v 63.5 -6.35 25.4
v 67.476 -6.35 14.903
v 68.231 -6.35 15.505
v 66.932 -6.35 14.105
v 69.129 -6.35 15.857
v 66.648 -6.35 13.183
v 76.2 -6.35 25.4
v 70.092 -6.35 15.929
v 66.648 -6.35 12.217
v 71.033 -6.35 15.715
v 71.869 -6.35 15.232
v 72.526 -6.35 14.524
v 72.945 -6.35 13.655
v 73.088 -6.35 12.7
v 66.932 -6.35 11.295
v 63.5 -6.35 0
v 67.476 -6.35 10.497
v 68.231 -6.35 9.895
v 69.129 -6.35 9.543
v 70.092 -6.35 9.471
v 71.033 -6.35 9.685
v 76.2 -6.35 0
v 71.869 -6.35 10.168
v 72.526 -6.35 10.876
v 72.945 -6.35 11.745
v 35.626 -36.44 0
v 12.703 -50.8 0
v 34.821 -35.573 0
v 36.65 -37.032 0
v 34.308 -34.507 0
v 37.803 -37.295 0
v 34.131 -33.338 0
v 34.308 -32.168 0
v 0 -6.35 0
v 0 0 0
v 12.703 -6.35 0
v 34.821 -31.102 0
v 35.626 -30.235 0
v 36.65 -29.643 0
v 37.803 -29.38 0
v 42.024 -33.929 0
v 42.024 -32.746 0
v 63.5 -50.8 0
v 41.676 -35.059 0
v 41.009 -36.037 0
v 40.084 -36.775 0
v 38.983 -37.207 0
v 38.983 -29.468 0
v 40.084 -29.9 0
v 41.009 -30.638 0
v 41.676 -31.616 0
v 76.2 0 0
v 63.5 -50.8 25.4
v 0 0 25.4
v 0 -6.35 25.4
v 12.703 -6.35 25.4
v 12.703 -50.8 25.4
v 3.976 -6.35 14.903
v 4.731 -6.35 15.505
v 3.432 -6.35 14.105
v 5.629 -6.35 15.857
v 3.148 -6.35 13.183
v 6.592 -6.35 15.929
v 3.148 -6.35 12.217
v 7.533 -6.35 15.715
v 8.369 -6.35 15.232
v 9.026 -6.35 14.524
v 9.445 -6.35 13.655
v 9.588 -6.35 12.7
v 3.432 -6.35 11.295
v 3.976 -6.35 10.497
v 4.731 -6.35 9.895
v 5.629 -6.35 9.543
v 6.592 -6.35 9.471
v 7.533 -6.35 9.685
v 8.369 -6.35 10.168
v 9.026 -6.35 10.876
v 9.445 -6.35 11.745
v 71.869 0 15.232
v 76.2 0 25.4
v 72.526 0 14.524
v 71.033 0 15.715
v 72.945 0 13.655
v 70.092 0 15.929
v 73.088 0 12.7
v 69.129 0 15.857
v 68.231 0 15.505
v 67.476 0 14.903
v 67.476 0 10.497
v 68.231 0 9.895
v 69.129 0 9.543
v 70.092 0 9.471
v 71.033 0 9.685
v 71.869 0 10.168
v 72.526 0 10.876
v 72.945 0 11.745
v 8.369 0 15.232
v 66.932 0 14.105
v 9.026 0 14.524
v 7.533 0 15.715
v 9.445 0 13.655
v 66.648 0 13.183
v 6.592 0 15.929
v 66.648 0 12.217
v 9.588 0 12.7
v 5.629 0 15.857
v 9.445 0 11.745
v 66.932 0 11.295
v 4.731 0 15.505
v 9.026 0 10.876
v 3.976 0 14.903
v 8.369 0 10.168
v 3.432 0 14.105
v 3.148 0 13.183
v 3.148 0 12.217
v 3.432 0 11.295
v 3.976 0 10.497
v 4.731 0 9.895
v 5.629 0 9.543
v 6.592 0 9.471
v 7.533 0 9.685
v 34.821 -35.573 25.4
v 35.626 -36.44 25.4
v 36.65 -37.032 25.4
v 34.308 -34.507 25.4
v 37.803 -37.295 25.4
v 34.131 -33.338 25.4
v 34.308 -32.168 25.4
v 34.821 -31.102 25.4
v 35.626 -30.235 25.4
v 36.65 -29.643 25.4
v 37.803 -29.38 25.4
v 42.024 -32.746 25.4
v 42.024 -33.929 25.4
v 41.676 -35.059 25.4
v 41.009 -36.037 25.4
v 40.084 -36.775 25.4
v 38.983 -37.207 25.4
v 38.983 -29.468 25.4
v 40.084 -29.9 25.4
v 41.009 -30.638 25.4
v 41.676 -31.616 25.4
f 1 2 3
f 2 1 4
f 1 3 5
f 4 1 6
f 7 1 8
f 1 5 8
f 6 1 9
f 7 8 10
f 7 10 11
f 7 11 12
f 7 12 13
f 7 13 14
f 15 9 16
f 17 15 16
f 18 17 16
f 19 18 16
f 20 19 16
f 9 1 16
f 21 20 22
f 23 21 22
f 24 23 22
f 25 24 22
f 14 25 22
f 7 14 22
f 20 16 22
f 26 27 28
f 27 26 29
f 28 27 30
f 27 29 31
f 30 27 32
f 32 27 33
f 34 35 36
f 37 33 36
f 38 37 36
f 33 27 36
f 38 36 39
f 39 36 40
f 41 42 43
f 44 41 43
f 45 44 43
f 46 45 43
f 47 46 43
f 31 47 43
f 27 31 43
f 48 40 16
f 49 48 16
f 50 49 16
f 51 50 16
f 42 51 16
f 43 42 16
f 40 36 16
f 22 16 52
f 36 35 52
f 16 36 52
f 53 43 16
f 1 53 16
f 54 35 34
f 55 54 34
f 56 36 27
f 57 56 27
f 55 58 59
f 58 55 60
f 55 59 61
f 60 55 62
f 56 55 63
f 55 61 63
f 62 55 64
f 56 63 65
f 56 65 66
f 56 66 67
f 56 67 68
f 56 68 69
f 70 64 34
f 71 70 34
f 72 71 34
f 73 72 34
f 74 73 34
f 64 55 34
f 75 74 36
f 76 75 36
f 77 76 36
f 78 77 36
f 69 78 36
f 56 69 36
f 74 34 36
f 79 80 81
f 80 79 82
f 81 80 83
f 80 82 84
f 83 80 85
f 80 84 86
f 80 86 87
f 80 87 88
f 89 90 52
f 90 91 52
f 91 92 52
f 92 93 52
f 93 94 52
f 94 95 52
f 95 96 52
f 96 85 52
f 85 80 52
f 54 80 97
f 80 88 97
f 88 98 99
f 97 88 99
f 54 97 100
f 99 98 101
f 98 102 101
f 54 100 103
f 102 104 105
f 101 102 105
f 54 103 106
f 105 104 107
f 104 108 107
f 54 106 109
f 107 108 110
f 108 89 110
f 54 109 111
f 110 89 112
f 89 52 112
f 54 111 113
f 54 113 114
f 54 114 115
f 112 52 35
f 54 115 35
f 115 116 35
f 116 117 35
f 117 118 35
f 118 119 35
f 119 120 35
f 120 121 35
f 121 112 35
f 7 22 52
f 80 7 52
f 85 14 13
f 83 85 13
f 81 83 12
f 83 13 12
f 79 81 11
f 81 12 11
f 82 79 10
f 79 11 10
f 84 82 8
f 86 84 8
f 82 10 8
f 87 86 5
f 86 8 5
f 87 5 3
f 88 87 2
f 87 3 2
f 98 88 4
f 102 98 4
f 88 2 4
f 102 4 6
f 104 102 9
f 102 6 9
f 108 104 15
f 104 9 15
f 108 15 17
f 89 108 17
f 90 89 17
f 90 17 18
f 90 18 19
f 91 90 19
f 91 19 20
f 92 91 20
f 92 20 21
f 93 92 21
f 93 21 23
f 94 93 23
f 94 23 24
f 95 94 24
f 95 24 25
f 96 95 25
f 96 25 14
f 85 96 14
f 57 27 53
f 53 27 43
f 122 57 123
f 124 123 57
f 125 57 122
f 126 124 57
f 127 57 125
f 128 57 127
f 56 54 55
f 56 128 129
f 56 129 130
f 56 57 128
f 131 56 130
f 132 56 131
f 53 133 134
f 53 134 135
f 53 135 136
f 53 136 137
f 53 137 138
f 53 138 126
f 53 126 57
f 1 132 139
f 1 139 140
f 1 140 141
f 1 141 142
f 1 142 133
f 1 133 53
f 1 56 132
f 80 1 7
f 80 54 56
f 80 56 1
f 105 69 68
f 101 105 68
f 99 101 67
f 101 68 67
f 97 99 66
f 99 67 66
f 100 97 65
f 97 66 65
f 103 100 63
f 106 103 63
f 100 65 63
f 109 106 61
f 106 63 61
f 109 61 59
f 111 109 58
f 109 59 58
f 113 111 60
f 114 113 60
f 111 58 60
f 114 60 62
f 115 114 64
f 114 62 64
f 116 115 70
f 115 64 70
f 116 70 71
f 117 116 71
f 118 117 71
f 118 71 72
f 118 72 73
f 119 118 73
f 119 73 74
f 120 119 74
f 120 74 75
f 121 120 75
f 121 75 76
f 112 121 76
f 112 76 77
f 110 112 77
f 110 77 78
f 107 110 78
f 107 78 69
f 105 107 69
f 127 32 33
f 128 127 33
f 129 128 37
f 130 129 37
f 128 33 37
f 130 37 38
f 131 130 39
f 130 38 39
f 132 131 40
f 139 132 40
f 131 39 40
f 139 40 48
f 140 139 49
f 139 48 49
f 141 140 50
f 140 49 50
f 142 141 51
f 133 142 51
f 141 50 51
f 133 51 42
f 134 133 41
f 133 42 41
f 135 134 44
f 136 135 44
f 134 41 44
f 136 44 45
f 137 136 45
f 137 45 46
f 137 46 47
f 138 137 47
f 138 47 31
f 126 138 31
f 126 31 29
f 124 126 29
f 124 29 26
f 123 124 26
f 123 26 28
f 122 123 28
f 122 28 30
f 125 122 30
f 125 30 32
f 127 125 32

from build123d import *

# Parameters (mm, degrees)
F1_DEPTH = 25.4
F4_R     = 3.2385
F5_DEPTH = 25.4
F3_R     = 3.2385
F6_DEPTH = 25.4
F8_D     = 7.9375


with BuildPart() as f1:
    # F0 (on Top) → F1 (new body)
    with BuildSketch(Plane.XY):
        Polygon((76.2, 0), (0, 0), (0, -6.35), (12.7030108124, -6.35), (12.7030108124, -50.8), (63.5, -50.8), (63.5, -6.35), (76.2, -6.35), align=None)
    extrude(amount=F1_DEPTH)

    # F4 (on face) → F5 (cut)
    with BuildSketch(Plane.XZ.offset(6.35)):
        with Locations((6.35, 12.7)):
            Circle(F4_R)
    extrude(amount=-F5_DEPTH, mode=Mode.SUBTRACT)

    # F3 (on face) → F6 (cut)
    with BuildSketch(Plane.XZ.offset(6.35)):
        with Locations((69.85, 12.7)):
            Circle(F3_R)
    extrude(amount=-F6_DEPTH, mode=Mode.SUBTRACT)

    # F8 (through all)
    with Locations(Plane.XY.offset(25.4)):
        with Locations((38.1, -33.3375)):
            Hole(F8_D / 2)


solid = f1.part
